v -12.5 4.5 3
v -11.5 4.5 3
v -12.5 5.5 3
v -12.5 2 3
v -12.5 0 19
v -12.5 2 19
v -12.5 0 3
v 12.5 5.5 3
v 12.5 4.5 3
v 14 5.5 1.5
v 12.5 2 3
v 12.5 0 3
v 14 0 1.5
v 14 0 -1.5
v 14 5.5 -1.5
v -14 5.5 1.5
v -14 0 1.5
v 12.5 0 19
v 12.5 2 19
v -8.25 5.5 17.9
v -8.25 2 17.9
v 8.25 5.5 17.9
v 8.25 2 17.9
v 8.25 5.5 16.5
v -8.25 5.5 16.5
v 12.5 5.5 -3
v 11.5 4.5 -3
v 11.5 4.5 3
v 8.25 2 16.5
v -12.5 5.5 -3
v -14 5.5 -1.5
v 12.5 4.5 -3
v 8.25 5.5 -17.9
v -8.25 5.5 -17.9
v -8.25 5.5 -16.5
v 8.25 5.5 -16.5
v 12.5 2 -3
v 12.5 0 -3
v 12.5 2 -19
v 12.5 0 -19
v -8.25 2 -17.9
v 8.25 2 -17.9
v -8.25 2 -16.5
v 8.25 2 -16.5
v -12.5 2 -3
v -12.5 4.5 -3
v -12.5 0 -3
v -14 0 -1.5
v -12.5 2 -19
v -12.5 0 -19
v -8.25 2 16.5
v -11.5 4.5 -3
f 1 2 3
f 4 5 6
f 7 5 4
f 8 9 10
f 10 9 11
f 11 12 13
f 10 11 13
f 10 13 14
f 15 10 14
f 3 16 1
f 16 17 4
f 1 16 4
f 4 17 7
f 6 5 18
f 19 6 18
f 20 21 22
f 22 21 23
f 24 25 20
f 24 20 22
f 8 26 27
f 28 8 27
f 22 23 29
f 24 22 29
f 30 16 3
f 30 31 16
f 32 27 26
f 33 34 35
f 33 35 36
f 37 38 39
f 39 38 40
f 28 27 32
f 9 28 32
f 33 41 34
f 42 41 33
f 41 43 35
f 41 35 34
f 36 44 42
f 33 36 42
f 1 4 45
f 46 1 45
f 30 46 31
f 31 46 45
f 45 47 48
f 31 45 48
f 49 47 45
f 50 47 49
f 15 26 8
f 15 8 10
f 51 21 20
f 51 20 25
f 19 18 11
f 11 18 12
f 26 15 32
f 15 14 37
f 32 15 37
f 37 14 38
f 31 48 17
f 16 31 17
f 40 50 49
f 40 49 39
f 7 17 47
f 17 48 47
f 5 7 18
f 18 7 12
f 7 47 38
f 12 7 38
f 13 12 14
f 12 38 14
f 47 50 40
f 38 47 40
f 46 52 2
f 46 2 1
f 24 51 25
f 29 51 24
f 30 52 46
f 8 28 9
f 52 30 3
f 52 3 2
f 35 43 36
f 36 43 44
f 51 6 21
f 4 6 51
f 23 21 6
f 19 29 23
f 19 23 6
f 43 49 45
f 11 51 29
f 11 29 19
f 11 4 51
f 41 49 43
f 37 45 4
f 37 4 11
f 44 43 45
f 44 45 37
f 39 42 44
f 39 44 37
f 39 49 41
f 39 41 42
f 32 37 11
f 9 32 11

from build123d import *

# Parameters (mm, degrees)
SKETCH1_W                = 25
SKETCH1_H                = 38
SKETCH1_W_2              = 16.5
SKETCH1_H_2              = 1.4
BOSS_EXTRUDE1_DEPTH      = 2
SKETCH1_3_W              = 16.5
SKETCH1_3_H              = 1.4
BOSS_EXTRUDE2_DEPTH      = 5.5
BOSS_EXTRUDE3_DEPTH      = 3
BOSS_EXTRUDE3_DEPTH_BACK = 3


with BuildPart() as part:
    # Sketch1 → Boss-Extrude1 (new body)
    with BuildSketch(Plane(origin=(0, 0, 0), x_dir=(1, 0, 0), z_dir=(0, 1, 0))):
        Rectangle(SKETCH1_W, SKETCH1_H)
        with Locations((0, -17.2)):
            Rectangle(SKETCH1_W_2, SKETCH1_H_2, mode=Mode.SUBTRACT)
        with Locations((0, 17.2)):
            Rectangle(SKETCH1_W_2, SKETCH1_H_2, mode=Mode.SUBTRACT)
    extrude(amount=BOSS_EXTRUDE1_DEPTH)

    # Sketch1<3> → Boss-Extrude2 (add)
    with BuildSketch(Plane(origin=(0, 0, 0), x_dir=(1, 0, 0), z_dir=(0, 1, 0))):
        Polygon((-14, -1.5), (-12.5, -3), (-12.5, 3), (-14, 1.5), align=None)
        Polygon((12.5, 3), (12.5, -3), (14, -1.5), (14, 1.5), align=None)
        with Locations((0, 17.2)):
            Rectangle(SKETCH1_3_W, SKETCH1_3_H)
        with Locations((0, -17.2)):
            Rectangle(SKETCH1_3_W, SKETCH1_3_H)
    extrude(amount=BOSS_EXTRUDE2_DEPTH)

    # Sketch2 → Boss-Extrude3 (add, two sides: drawn at the far end of the back side and taken through both)
    with BuildSketch(Plane.XY.offset(-BOSS_EXTRUDE3_DEPTH_BACK)):
        Polygon((12.5, 5.5), (11.5, 4.5), (12.5, 4.5), align=None)
        Polygon((-11.5, 4.5), (-12.5, 4.5), (-12.5, 5.5), align=None)
    extrude(amount=BOSS_EXTRUDE3_DEPTH + BOSS_EXTRUDE3_DEPTH_BACK)


solid = part.part
